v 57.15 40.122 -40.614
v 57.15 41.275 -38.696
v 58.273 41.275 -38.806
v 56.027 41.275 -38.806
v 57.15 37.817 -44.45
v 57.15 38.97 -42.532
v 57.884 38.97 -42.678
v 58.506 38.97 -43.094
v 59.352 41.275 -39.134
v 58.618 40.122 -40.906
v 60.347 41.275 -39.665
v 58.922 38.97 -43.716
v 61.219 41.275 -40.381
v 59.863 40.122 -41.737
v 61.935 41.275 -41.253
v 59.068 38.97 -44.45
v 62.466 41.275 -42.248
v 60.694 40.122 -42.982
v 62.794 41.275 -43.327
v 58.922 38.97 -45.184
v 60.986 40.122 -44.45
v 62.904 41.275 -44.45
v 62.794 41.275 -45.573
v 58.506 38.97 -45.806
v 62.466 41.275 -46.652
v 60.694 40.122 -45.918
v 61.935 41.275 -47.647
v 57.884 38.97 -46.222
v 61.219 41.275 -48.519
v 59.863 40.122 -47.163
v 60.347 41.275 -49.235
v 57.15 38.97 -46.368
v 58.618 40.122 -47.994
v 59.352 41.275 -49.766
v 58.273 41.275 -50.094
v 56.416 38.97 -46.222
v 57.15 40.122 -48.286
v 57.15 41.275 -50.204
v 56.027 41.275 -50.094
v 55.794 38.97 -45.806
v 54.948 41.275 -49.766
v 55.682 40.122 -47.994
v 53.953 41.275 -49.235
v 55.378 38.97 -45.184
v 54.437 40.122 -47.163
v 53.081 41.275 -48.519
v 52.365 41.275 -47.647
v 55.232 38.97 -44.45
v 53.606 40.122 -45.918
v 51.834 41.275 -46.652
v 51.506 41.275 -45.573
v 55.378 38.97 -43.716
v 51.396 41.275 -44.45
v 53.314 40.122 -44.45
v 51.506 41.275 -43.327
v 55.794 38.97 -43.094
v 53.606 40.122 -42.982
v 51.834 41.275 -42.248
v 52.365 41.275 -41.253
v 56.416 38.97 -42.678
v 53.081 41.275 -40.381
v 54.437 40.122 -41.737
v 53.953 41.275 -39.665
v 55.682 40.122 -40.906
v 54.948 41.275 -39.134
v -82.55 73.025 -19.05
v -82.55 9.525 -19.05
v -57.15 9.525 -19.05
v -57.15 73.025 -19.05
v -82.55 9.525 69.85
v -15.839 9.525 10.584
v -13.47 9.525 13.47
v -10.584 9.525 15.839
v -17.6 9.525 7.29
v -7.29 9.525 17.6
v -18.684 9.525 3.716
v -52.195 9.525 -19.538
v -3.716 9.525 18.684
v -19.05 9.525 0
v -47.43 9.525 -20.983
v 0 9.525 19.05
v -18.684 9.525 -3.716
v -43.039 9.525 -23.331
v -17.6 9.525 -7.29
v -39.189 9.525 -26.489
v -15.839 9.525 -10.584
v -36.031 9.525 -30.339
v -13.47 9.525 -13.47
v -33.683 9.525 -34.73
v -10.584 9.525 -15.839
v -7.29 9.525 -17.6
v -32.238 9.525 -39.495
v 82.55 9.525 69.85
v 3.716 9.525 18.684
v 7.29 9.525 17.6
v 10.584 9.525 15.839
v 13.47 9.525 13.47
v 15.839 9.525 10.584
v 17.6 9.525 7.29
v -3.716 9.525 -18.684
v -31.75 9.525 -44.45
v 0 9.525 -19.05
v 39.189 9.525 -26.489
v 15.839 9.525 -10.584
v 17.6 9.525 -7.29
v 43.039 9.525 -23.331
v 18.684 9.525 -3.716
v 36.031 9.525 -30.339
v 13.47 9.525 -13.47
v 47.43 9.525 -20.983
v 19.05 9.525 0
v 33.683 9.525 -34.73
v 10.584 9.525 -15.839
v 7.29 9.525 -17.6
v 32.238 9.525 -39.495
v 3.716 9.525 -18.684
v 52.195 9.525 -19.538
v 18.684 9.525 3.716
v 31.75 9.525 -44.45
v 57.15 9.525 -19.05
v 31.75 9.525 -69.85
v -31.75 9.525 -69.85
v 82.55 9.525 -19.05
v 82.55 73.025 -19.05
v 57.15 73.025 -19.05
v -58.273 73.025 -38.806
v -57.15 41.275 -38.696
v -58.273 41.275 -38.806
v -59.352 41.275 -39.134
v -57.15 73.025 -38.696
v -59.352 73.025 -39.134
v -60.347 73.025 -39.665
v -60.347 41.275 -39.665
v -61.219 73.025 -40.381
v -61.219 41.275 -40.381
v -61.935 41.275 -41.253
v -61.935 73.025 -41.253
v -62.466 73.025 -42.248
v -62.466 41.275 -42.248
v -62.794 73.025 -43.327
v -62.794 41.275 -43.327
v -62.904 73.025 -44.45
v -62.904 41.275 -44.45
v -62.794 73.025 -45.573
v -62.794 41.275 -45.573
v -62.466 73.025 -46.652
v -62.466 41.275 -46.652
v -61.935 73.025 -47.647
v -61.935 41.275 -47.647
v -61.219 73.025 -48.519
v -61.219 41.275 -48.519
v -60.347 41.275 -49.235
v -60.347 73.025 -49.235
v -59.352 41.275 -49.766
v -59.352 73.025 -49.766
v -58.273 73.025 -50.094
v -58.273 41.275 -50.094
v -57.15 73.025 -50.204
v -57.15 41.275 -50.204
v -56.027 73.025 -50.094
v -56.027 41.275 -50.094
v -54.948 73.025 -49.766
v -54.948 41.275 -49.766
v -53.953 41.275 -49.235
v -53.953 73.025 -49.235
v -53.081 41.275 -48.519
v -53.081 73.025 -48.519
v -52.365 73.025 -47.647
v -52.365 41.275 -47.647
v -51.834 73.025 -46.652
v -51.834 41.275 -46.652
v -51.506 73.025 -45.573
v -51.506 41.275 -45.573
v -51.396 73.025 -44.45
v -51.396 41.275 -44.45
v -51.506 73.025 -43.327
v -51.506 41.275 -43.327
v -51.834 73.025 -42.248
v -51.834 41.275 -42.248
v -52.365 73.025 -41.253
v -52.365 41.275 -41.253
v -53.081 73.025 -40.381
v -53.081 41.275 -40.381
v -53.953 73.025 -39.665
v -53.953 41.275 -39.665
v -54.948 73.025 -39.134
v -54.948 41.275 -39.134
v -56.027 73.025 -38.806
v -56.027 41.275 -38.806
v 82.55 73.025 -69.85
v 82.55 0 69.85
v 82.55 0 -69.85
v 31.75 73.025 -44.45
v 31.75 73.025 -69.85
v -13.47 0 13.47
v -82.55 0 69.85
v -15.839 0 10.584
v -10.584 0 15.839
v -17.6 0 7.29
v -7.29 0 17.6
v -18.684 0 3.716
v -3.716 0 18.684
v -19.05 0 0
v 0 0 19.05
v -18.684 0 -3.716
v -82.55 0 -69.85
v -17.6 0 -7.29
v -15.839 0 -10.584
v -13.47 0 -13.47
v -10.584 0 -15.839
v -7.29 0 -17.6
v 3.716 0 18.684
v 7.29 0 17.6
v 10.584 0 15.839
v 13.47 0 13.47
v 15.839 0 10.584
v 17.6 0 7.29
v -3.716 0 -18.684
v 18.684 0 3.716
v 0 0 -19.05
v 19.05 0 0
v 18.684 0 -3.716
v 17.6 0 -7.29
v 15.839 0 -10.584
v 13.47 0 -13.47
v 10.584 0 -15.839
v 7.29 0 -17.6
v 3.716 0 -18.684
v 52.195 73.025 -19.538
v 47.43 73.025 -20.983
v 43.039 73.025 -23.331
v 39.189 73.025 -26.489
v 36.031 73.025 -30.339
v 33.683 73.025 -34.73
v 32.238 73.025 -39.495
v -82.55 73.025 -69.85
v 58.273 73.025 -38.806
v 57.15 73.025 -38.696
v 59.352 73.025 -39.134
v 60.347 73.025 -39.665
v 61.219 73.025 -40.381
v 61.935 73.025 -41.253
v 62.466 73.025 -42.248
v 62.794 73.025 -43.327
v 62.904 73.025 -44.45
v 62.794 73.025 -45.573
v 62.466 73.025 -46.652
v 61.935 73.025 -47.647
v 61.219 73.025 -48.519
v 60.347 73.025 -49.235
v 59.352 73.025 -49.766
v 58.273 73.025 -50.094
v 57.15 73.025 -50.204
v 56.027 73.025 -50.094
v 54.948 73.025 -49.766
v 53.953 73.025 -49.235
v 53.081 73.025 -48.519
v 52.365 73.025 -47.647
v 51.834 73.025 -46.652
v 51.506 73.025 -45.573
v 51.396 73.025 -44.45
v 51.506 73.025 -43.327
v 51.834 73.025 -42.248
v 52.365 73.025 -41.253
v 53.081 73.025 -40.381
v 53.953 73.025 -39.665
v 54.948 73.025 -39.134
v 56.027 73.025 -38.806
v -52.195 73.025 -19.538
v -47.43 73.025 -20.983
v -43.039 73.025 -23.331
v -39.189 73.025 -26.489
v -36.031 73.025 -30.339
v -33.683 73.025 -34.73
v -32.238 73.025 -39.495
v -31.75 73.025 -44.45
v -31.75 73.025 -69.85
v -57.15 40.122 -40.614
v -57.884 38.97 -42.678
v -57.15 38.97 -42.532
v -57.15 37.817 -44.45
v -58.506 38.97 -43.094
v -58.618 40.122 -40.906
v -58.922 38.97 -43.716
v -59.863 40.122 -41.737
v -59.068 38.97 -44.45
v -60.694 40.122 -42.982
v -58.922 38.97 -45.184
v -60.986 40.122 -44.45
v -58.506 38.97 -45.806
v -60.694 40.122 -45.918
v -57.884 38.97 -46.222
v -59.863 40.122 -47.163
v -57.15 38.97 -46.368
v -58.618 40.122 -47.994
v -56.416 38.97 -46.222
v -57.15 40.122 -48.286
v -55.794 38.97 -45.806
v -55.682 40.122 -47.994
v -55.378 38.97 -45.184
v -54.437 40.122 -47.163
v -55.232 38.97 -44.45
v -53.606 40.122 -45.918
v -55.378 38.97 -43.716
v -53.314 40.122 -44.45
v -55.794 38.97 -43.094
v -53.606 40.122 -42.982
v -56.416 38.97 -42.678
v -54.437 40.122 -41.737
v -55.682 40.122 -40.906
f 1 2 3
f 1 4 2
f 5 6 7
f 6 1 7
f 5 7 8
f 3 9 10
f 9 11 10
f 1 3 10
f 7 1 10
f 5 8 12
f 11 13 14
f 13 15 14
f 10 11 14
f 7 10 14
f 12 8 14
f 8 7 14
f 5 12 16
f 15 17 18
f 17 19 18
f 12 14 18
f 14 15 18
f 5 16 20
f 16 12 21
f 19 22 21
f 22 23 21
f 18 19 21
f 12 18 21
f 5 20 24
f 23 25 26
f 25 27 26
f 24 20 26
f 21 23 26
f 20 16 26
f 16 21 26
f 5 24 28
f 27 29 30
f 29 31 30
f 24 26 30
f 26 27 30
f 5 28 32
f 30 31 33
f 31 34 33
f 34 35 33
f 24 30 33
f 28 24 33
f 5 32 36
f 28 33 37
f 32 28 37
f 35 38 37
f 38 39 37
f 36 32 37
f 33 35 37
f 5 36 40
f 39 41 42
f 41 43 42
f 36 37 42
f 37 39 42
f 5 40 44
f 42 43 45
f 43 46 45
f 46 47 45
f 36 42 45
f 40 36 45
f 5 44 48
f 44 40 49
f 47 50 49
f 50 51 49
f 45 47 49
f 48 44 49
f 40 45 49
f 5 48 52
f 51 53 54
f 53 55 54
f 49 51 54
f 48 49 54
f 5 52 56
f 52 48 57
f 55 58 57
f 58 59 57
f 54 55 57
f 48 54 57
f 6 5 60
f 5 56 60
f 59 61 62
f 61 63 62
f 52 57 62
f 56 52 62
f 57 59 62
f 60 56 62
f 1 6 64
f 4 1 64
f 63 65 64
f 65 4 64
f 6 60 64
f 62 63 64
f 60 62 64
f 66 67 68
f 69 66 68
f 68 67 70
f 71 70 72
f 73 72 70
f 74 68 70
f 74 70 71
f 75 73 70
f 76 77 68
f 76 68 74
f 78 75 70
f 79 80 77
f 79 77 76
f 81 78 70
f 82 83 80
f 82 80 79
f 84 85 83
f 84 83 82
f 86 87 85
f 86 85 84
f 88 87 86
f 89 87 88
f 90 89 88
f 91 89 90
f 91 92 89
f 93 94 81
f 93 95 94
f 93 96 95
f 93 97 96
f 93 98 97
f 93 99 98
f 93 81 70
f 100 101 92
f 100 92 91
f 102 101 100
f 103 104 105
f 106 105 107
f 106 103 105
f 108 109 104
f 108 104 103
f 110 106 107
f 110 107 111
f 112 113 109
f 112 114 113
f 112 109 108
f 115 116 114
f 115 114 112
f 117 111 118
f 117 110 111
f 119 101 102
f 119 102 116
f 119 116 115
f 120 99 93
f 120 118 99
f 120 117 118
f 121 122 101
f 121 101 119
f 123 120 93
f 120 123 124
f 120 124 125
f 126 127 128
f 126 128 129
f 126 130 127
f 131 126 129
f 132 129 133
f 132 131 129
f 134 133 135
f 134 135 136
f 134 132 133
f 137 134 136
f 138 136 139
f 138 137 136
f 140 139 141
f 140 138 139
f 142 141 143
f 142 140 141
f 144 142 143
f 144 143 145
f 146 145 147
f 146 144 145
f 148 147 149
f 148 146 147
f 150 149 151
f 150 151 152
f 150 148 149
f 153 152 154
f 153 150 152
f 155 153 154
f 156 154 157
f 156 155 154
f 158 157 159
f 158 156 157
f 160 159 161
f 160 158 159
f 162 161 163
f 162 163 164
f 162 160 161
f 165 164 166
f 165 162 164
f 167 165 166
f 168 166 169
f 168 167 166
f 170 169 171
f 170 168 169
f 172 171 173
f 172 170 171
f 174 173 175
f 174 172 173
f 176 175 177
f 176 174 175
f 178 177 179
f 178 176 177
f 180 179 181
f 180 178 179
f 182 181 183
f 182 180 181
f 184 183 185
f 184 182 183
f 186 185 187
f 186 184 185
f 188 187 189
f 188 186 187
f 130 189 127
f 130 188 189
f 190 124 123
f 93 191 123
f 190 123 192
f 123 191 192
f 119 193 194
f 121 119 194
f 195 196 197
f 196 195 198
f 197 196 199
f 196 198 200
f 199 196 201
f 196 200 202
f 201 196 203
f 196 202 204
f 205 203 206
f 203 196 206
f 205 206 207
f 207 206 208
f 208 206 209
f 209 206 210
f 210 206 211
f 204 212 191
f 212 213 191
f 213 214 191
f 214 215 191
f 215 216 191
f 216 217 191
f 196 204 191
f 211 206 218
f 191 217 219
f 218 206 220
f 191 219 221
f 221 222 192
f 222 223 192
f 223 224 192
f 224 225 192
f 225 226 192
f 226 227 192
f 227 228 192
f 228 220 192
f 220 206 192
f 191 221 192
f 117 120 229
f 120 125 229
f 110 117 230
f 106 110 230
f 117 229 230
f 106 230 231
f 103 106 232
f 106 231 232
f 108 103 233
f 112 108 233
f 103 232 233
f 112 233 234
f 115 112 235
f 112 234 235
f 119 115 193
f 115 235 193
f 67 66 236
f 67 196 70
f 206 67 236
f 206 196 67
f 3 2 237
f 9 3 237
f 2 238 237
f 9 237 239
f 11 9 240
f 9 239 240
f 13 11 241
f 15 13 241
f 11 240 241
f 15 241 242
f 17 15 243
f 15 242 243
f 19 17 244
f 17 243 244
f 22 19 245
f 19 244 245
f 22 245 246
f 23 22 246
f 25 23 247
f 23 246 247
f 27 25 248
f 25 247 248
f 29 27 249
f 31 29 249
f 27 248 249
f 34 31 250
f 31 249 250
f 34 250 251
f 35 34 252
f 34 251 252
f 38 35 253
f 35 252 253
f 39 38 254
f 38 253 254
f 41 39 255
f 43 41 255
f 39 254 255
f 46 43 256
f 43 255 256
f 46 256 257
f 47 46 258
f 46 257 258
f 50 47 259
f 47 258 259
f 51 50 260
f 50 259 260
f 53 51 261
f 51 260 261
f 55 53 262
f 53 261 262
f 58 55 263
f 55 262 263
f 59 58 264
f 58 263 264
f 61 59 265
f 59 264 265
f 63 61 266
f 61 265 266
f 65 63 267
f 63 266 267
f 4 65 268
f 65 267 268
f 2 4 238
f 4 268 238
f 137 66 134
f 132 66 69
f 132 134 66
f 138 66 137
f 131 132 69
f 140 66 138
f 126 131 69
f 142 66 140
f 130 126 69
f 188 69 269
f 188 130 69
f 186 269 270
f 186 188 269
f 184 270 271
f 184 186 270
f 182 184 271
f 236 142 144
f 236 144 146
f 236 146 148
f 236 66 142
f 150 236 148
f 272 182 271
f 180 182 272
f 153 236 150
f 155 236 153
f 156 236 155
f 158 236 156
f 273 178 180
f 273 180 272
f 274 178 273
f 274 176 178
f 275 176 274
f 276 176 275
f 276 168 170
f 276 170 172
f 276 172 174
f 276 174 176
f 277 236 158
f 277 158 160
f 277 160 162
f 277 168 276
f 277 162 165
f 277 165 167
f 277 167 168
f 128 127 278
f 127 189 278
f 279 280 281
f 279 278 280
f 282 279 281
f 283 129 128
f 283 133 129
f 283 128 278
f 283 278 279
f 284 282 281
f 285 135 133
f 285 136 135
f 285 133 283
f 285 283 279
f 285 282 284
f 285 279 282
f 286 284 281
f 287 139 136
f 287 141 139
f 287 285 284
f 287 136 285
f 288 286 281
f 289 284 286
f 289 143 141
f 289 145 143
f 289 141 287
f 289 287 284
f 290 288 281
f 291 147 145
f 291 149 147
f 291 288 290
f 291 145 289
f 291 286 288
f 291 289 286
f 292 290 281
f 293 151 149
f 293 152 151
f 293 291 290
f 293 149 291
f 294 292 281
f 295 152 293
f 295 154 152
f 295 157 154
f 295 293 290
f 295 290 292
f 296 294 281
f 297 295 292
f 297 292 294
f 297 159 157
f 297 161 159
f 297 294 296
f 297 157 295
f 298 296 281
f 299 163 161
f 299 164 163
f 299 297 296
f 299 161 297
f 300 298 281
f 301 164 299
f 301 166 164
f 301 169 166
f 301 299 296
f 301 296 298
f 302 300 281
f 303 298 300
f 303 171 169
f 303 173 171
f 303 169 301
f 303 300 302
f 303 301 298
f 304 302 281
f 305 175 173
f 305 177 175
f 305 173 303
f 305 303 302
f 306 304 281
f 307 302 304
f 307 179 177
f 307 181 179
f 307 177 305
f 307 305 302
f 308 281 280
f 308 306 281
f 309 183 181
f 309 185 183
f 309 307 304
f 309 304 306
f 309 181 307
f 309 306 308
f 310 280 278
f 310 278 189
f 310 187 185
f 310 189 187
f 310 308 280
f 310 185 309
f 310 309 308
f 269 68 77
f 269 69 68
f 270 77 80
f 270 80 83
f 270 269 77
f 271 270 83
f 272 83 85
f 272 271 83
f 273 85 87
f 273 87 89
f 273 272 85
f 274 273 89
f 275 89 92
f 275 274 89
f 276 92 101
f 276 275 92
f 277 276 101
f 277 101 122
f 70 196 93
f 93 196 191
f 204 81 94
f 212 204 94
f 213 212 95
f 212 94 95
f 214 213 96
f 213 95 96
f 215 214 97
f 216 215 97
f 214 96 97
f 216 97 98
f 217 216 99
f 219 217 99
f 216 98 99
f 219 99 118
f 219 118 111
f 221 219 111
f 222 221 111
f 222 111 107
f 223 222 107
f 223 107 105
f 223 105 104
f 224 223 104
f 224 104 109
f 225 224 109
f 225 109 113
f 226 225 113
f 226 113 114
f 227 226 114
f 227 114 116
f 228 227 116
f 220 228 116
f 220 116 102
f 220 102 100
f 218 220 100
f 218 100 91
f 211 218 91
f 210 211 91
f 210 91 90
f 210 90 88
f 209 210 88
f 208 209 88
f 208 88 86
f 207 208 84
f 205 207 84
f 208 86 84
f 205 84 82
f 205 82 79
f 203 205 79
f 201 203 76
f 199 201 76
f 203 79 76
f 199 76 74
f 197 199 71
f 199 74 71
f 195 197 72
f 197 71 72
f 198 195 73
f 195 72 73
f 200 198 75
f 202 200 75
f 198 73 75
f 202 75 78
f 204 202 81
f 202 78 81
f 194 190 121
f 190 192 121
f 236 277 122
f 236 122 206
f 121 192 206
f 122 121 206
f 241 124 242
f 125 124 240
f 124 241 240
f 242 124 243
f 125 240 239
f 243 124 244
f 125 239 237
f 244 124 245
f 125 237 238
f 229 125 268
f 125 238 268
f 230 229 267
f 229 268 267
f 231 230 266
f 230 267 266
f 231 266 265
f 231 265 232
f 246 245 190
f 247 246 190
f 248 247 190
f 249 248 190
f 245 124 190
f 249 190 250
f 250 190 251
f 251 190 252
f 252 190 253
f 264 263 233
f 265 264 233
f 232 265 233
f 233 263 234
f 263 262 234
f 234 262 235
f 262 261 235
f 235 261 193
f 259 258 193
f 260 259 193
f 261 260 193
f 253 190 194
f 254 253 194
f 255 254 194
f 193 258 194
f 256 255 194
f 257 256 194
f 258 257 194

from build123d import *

# Parameters (mm, degrees)
SKETCH1_W            = 165.1
SKETCH1_H            = 139.7
BOSS_EXTRUDE1_DEPTH  = 9.525
SKETCH2_W            = 50.8
SKETCH2_H            = 50.8
BOSS_EXTRUDE2_DEPTH  = 63.5
FILLET1_R            = 25.4
FILLET1_OF_MIRROR1_R = 25.4
SKETCH5_R            = 19.05
BASE_HOLE_DEPTH      = 126.402452129


with BuildPart() as part:
    # Sketch1 → Boss-Extrude1 (new body)
    with BuildSketch(Plane(origin=(0, 0, 0), x_dir=(1, 0, 0), z_dir=(0, 1, 0))):
        Rectangle(SKETCH1_W, SKETCH1_H)
    extrude(amount=BOSS_EXTRUDE1_DEPTH)

    # Sketch2 → Boss-Extrude2 (add)
    with BuildSketch(Plane(origin=(0, 9.525, 0), x_dir=(1, 0, 0), z_dir=(0, 1, 0))):
        with Locations((-57.15, 44.45)):
            Rectangle(SKETCH2_W, SKETCH2_H)
    boss_extrude2 = extrude(amount=BOSS_EXTRUDE2_DEPTH)

    # Sketch3 → 1/2-20 Tapped Hole1 (revolve, cut)
    with BuildSketch(Plane(origin=(-57.15, 73.025, -44.45), x_dir=(0, 0, 1), z_dir=(1, 0, 0))):
        Polygon((0, 0), (0, 35.20757432), (5.75437, 31.75), (5.75437, 0), align=None)
    f_1_2_20_tapped_hole1 = revolve(axis=Axis((-57.15, 79.375, -44.45), (0, -1, 0)), mode=Mode.SUBTRACT)

    # Fillet1
    fillet1_edges = [part.edges().sort_by_distance(p)[0] for p in [
        (-31.75, 41.275, -19.05),
    ]]
    fillet(fillet1_edges, radius=FILLET1_R)

    # Mirror1: Boss-Extrude2, 1/2-20 Tapped Hole1 across plane
    add(boss_extrude2.mirror(Plane(origin=(0, 0, 0), x_dir=(0, 0, 1), z_dir=(1, 0, 0))))
    add(f_1_2_20_tapped_hole1.mirror(Plane(origin=(0, 0, 0), x_dir=(0, 0, 1), z_dir=(1, 0, 0))), mode=Mode.SUBTRACT)

    # Fillet1 of Mirror1
    fillet1_of_mirror1_edges = [part.edges().sort_by_distance(p)[0] for p in [
        (31.75, 41.275, -19.05),
    ]]
    fillet(fillet1_of_mirror1_edges, radius=FILLET1_OF_MIRROR1_R)

    # Sketch5 → base hole (cut, through all)
    with BuildSketch(Plane(origin=(0, 9.525, 0), x_dir=(1, 0, 0), z_dir=(0, 1, 0))):
        with Locations(Location((0, 0, 0), (0, 0, 270))):
            Circle(SKETCH5_R)
    extrude(amount=-BASE_HOLE_DEPTH, mode=Mode.SUBTRACT)


solid = part.part
